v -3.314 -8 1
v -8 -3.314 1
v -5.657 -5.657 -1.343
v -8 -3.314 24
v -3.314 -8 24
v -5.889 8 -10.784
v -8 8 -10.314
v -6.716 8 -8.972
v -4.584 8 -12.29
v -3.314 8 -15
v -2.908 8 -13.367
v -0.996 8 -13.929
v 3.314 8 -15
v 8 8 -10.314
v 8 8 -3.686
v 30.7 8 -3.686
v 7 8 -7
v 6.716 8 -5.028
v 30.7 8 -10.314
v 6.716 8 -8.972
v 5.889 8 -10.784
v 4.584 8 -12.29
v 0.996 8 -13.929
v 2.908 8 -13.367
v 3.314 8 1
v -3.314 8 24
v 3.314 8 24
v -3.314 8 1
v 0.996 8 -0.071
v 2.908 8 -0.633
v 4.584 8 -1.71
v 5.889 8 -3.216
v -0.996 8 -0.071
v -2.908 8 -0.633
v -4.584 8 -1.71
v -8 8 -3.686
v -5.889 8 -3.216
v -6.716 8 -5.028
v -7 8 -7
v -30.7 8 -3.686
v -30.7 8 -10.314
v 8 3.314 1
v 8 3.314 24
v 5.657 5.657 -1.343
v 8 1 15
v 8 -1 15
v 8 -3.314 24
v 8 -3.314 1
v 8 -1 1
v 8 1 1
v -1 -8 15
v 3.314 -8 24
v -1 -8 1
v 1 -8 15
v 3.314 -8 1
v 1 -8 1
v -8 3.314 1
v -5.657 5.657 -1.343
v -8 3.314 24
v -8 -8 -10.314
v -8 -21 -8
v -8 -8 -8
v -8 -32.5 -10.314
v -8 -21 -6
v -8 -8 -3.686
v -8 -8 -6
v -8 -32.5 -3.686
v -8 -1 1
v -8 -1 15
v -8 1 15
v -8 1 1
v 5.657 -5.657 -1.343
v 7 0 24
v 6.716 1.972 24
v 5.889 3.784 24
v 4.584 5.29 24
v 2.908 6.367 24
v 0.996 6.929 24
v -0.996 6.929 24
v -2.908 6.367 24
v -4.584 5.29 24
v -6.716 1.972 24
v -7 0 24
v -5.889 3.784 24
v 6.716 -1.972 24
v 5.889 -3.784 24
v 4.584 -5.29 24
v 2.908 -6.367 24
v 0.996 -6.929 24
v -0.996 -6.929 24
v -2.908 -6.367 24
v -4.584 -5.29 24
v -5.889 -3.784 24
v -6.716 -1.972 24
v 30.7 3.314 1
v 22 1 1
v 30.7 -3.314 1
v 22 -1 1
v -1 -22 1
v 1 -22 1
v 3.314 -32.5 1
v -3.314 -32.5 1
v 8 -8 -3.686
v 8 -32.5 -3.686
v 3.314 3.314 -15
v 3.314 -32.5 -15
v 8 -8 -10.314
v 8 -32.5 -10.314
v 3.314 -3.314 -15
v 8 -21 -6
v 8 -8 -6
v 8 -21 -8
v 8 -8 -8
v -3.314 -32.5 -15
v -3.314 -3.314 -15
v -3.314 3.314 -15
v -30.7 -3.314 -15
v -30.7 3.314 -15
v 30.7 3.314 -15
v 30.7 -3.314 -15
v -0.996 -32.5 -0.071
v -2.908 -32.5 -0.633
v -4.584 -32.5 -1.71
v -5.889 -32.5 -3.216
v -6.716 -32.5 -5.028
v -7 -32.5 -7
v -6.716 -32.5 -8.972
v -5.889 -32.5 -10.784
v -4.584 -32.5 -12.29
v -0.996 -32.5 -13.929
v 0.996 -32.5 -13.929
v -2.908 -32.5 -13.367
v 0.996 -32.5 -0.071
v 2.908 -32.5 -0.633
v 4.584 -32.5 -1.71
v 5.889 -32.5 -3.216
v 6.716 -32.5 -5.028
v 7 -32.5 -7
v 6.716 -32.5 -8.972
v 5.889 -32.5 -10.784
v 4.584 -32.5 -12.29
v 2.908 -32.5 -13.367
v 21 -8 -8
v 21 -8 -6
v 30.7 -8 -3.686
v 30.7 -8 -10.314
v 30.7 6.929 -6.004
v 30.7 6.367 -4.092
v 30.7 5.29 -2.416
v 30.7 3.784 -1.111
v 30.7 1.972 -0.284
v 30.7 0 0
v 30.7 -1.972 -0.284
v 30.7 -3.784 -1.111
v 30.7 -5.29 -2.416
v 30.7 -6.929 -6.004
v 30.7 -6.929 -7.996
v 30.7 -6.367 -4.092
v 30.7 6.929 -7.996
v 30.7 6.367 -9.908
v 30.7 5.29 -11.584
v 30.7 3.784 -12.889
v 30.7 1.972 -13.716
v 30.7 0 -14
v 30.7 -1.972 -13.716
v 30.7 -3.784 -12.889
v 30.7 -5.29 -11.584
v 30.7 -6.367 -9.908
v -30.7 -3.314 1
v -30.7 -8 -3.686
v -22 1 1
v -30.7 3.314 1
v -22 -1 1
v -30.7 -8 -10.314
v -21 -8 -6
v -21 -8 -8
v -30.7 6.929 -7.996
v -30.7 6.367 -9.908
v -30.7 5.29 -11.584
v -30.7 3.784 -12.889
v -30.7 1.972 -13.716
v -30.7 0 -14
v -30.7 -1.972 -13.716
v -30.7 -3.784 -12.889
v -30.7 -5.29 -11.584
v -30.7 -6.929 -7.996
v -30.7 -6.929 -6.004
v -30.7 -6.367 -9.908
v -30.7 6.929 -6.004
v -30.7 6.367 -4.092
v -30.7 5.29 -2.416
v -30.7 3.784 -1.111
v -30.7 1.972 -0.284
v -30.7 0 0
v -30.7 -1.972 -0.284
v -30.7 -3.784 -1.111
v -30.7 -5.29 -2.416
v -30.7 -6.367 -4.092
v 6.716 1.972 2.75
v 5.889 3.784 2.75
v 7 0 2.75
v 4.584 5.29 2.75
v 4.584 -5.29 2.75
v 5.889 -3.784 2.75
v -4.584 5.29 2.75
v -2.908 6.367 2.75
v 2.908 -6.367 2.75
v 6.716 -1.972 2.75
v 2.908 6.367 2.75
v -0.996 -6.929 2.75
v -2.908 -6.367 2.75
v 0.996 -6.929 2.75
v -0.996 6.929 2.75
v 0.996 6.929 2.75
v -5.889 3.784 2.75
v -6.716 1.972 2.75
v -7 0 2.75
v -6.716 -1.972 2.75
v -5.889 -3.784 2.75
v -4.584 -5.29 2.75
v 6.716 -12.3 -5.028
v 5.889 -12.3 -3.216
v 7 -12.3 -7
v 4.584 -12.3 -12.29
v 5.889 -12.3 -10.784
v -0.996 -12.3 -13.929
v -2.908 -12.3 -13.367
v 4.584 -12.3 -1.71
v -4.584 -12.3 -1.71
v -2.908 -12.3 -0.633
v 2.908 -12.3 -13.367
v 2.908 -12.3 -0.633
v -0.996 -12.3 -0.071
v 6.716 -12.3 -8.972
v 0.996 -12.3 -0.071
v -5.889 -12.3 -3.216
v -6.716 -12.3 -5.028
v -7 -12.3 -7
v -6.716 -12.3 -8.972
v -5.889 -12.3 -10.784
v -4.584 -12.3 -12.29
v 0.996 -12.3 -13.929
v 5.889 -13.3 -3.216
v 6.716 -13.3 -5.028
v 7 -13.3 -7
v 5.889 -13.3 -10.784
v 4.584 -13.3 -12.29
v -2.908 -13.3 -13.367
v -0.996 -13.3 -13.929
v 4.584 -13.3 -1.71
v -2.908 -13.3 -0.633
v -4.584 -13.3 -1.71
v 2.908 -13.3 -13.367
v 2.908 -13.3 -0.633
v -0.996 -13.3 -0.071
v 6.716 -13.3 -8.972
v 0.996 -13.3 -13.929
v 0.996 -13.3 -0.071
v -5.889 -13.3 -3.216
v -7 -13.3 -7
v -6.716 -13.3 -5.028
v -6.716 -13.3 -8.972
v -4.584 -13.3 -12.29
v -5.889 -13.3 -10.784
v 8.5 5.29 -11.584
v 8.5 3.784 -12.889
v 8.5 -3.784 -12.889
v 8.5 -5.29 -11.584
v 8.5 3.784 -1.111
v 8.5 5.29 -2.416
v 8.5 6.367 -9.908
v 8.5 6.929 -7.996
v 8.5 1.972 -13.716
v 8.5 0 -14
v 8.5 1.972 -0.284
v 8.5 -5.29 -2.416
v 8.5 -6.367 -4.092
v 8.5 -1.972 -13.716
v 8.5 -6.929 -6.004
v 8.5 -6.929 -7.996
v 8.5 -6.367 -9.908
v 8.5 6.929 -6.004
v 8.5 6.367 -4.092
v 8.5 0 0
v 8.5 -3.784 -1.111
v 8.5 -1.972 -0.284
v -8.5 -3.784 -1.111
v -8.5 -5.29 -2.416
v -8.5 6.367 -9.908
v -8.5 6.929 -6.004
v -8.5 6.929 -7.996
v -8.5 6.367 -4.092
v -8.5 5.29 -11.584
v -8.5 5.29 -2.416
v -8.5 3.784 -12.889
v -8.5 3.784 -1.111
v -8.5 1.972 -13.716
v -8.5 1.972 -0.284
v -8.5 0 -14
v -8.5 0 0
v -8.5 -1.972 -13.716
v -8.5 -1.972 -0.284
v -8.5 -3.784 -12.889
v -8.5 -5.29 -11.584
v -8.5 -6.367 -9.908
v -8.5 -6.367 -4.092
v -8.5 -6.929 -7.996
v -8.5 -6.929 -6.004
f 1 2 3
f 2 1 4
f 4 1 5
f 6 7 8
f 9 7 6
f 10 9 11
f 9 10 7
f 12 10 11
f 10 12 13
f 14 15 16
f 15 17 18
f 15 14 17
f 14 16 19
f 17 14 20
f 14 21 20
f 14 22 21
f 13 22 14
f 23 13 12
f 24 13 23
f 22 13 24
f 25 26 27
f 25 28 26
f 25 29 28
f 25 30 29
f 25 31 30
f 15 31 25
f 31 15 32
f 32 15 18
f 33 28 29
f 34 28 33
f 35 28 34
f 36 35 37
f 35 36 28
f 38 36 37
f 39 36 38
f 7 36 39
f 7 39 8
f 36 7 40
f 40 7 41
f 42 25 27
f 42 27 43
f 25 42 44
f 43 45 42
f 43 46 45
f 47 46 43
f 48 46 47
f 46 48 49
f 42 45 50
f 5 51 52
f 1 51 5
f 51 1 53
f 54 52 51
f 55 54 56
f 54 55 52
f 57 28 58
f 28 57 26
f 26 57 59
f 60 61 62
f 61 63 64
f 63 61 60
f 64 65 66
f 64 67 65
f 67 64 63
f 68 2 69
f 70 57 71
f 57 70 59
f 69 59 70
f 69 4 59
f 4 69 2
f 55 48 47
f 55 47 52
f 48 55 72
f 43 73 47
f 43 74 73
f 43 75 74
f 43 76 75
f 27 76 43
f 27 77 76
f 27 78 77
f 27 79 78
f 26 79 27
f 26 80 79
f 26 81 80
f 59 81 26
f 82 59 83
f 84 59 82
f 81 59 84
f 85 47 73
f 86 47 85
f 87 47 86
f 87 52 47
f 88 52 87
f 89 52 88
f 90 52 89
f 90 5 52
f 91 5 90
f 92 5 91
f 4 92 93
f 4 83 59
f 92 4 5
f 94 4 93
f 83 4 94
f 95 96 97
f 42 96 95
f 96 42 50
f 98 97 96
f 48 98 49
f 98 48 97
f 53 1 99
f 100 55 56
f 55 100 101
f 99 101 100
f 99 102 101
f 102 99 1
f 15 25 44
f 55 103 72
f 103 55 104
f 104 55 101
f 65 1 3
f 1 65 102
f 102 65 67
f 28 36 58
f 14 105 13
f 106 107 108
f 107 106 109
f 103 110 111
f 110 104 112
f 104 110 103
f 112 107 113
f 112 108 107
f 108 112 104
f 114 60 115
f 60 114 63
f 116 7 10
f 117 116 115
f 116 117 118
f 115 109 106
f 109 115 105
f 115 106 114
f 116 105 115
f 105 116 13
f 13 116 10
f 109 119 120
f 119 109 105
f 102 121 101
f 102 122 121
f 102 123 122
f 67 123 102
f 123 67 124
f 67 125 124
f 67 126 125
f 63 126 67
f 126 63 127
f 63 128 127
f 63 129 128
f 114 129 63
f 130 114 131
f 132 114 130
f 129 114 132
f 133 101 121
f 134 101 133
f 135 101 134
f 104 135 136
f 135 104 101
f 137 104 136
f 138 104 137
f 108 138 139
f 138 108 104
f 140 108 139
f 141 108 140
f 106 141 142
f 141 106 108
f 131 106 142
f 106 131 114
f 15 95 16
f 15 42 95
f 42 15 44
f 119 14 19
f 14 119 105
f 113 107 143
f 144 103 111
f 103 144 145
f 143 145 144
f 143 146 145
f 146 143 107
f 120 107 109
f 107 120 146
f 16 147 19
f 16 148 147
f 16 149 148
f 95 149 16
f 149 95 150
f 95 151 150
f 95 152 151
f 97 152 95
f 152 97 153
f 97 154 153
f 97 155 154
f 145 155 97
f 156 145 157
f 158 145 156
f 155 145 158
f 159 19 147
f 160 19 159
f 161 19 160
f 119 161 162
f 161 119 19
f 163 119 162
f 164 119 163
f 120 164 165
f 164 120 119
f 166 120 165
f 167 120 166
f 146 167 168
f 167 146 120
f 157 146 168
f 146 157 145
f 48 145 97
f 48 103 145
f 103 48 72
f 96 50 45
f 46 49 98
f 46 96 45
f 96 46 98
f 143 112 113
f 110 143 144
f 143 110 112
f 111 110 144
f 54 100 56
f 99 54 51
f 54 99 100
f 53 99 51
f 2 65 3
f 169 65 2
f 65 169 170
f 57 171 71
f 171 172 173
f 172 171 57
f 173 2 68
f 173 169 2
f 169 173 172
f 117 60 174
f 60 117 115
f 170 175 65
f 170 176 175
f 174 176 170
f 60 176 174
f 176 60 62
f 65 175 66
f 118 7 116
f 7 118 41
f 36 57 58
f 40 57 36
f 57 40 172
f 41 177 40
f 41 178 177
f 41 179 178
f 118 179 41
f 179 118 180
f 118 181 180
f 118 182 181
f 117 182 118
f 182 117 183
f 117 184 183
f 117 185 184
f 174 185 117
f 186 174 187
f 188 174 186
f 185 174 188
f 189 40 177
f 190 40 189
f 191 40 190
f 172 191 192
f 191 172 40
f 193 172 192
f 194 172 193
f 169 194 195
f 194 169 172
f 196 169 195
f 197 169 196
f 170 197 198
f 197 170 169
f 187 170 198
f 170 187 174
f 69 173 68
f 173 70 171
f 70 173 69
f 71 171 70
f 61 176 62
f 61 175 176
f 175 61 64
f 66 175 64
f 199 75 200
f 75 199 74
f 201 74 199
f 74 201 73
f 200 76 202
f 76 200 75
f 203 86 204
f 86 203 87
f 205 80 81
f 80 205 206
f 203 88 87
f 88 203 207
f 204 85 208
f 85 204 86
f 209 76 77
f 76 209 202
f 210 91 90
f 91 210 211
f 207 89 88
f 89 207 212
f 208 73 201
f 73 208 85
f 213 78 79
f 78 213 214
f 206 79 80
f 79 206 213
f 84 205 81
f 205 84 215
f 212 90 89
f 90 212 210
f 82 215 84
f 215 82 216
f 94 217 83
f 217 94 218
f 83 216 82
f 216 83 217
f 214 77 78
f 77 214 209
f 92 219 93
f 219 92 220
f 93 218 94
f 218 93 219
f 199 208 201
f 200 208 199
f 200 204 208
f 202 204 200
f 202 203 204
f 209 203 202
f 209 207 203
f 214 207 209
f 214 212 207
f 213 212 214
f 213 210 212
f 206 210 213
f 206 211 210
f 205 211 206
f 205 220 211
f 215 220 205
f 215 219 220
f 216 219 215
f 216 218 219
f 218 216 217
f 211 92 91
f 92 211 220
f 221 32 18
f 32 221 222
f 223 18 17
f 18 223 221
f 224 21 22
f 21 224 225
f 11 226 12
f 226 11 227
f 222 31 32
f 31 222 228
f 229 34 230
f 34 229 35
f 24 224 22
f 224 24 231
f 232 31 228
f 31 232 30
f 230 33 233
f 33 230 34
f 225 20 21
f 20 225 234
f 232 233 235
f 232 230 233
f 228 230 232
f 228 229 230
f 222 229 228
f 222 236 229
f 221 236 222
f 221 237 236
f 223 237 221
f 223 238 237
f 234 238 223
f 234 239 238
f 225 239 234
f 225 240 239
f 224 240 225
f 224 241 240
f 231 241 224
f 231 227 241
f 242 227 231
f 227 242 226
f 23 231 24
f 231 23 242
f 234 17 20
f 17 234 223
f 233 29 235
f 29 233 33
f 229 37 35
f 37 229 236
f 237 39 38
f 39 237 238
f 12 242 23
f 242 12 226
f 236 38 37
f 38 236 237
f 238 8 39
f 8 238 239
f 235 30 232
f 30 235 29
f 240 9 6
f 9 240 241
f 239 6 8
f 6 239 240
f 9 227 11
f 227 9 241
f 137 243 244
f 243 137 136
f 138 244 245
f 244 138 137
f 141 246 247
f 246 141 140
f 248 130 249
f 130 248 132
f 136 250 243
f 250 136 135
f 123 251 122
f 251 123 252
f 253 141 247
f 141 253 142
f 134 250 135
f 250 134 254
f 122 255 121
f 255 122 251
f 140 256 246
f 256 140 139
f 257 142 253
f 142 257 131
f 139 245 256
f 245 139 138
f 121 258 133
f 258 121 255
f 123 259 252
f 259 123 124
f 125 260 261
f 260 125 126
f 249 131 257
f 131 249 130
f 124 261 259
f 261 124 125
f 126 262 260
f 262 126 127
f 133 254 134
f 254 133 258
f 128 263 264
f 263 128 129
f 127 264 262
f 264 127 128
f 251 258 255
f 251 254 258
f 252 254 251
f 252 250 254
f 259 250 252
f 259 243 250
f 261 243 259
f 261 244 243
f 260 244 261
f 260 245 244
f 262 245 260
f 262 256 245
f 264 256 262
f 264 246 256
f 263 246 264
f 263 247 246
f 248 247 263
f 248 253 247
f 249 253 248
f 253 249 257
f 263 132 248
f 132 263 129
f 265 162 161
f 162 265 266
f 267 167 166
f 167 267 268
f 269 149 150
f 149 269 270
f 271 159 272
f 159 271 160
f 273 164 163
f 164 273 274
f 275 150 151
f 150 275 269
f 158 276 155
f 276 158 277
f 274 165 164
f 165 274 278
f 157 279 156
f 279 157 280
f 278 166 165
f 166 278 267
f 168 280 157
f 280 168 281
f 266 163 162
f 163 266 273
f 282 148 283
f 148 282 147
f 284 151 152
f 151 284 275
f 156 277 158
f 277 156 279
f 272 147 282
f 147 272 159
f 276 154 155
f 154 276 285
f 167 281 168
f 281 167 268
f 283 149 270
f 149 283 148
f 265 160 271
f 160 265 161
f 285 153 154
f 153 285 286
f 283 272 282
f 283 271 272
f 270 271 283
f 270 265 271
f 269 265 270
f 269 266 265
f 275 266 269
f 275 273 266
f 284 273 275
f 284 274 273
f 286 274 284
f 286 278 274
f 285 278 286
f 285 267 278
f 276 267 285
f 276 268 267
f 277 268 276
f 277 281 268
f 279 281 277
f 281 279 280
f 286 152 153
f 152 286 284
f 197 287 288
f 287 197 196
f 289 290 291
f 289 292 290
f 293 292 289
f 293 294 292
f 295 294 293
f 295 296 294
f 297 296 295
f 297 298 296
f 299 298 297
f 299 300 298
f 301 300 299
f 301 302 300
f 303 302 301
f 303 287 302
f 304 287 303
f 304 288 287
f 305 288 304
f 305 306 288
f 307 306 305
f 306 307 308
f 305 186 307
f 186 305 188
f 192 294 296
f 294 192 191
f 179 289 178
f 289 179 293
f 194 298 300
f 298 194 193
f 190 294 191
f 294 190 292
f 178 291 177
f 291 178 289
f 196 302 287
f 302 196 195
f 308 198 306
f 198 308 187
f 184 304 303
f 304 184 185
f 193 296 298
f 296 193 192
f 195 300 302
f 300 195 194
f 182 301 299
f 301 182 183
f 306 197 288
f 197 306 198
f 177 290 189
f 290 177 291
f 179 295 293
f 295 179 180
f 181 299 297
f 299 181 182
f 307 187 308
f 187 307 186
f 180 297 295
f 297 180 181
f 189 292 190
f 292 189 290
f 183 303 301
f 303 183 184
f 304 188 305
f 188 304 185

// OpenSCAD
id = 14;
fn = 8;
od = (id+2)/cos(180/fn);

module tri(pos) {
    b = 15;
    h = 15;
    w = 2;
    translate(pos)
    linear_extrude(height = w, center = true, convexity = 10, twist = 0)
    polygon(points=[[0,0],[h,0],[0,b]], paths=[[0,1,2]]);
}

module body () {
    union() {
        translate([0,0,-id/2])
        rotate([0,0,180/fn])
        cylinder(h = 38-id/2, d = od, $fn=fn);

        rotate([90,0,0])
        translate([0,-id/2,-id/2-1])
        rotate([0,0,180/fn])
        cylinder(h = 40.5, d = od, $fn=fn);

        rotate([0,90,0])
        translate([id/2,0,0])
        rotate([0,0,180/fn])
        cylinder(h = 37.7-id/2, d = od, $fn=fn);
        
        rotate(a=[90,0,0])
        tri([7,1,0]);
        
        rotate(a=[0,0,270])
        tri([7,7,-id/2]);
        
        rotate(a=[90,00,-90])
        tri([7,1,0]);
    }
}

module hole () {
    b = 2;
    union() {
        translate([0,0,38-13-22.25])
        cylinder(h = 22.25+b, d = id);

        rotate([90,0,0])
        translate([0,-id/2,-id/2-b])
        cylinder(h = 19.3+b, d = id);

        rotate([90,0,0])
        translate([0,-id/2,-id/2+(40.5-20.2)])
        cylinder(h = 20.2+b, d = id);

        rotate([0,90,0])
        translate([id/2,0,-id/2+(37.7-22.2)])
        cylinder(h = 22.2+b, d = id);
        
        rotate([0,-90,0])
        translate([-id/2,0,-id/2+(37.7-22.2)])
        cylinder(h = 22.2+b, d = id);
        
    }
}

module corner() {
    difference() {
        body();
        hole();
    }
}

module center() {
    difference() {
        union() {
            body();
            
            rotate([0,-90,0])
            translate([-id/2,0,0])
            rotate([0,0,180/fn])
            cylinder(h = 37.7-id/2, d = od, $fn=fn);
            
            rotate(a=[90,0,180])
            tri([7,1,0]);
            
            rotate(a=[0,0,180])
            tri([7,7,-id/2]);
        }
        hole();
    }
}

center();
